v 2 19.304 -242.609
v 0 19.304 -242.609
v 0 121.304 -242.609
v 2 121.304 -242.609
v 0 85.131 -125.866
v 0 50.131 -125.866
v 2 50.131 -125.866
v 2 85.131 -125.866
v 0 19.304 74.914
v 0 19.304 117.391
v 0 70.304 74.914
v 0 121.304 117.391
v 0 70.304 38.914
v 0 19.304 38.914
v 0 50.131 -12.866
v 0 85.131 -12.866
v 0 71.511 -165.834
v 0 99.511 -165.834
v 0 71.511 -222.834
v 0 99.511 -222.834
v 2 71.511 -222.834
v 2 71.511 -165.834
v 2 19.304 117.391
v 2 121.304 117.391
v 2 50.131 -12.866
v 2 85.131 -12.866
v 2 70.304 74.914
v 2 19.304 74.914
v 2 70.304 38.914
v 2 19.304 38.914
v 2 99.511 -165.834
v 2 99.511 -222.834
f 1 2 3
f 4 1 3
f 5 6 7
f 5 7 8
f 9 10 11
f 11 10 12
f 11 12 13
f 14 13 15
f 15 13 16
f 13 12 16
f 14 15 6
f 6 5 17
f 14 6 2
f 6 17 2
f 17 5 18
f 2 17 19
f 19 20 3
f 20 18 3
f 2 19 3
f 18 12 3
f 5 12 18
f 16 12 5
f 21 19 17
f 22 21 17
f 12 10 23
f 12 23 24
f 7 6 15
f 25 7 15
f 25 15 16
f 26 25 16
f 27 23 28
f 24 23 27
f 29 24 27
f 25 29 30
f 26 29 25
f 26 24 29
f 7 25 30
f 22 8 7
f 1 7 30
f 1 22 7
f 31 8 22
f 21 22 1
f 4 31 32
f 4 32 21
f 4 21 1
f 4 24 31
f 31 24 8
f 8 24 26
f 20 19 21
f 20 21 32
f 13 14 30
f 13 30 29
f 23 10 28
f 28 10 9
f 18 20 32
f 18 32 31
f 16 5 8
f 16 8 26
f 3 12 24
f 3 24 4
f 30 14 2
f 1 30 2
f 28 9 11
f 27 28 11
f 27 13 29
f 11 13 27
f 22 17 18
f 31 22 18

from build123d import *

# Parameters (mm, degrees)
SKETCH1_W           = 360
SKETCH1_H           = 102
BOSS_EXTRUDE1_DEPTH = 2
SKETCH2_W           = 36
SKETCH2_H           = 51
SKETCH2_W_2         = 113
SKETCH2_H_2         = 35
CUT_EXTRUDE1_DEPTH  = 10
SKETCH3_W           = 57
SKETCH3_H           = 28
CUT_EXTRUDE2_DEPTH  = 10


with BuildPart() as part:
    # Sketch1 → Boss-Extrude1 (new body)
    with BuildSketch(Plane(origin=(0, 0, 0), x_dir=(0, 0, -1), z_dir=(1, 0, 0))):
        with Locations((62.608695652, 70.304347826)):
            Rectangle(SKETCH1_W, SKETCH1_H)
    extrude(amount=BOSS_EXTRUDE1_DEPTH)

    # Sketch2 → Cut-Extrude1 (cut)
    with BuildSketch(Plane.ZY):
        with Locations((56.914343826, 44.804347826)):
            Rectangle(SKETCH2_W, SKETCH2_H)
        with Locations((-69.366260537, 67.630807185)):
            Rectangle(SKETCH2_W_2, SKETCH2_H_2)
    extrude(amount=-CUT_EXTRUDE1_DEPTH, mode=Mode.SUBTRACT)

    # Sketch3 → Cut-Extrude2 (cut)
    with BuildSketch(Plane.ZY):
        with Locations((-194.333824882, 85.510777566)):
            Rectangle(SKETCH3_W, SKETCH3_H)
    extrude(amount=-CUT_EXTRUDE2_DEPTH, mode=Mode.SUBTRACT)


solid = part.part
